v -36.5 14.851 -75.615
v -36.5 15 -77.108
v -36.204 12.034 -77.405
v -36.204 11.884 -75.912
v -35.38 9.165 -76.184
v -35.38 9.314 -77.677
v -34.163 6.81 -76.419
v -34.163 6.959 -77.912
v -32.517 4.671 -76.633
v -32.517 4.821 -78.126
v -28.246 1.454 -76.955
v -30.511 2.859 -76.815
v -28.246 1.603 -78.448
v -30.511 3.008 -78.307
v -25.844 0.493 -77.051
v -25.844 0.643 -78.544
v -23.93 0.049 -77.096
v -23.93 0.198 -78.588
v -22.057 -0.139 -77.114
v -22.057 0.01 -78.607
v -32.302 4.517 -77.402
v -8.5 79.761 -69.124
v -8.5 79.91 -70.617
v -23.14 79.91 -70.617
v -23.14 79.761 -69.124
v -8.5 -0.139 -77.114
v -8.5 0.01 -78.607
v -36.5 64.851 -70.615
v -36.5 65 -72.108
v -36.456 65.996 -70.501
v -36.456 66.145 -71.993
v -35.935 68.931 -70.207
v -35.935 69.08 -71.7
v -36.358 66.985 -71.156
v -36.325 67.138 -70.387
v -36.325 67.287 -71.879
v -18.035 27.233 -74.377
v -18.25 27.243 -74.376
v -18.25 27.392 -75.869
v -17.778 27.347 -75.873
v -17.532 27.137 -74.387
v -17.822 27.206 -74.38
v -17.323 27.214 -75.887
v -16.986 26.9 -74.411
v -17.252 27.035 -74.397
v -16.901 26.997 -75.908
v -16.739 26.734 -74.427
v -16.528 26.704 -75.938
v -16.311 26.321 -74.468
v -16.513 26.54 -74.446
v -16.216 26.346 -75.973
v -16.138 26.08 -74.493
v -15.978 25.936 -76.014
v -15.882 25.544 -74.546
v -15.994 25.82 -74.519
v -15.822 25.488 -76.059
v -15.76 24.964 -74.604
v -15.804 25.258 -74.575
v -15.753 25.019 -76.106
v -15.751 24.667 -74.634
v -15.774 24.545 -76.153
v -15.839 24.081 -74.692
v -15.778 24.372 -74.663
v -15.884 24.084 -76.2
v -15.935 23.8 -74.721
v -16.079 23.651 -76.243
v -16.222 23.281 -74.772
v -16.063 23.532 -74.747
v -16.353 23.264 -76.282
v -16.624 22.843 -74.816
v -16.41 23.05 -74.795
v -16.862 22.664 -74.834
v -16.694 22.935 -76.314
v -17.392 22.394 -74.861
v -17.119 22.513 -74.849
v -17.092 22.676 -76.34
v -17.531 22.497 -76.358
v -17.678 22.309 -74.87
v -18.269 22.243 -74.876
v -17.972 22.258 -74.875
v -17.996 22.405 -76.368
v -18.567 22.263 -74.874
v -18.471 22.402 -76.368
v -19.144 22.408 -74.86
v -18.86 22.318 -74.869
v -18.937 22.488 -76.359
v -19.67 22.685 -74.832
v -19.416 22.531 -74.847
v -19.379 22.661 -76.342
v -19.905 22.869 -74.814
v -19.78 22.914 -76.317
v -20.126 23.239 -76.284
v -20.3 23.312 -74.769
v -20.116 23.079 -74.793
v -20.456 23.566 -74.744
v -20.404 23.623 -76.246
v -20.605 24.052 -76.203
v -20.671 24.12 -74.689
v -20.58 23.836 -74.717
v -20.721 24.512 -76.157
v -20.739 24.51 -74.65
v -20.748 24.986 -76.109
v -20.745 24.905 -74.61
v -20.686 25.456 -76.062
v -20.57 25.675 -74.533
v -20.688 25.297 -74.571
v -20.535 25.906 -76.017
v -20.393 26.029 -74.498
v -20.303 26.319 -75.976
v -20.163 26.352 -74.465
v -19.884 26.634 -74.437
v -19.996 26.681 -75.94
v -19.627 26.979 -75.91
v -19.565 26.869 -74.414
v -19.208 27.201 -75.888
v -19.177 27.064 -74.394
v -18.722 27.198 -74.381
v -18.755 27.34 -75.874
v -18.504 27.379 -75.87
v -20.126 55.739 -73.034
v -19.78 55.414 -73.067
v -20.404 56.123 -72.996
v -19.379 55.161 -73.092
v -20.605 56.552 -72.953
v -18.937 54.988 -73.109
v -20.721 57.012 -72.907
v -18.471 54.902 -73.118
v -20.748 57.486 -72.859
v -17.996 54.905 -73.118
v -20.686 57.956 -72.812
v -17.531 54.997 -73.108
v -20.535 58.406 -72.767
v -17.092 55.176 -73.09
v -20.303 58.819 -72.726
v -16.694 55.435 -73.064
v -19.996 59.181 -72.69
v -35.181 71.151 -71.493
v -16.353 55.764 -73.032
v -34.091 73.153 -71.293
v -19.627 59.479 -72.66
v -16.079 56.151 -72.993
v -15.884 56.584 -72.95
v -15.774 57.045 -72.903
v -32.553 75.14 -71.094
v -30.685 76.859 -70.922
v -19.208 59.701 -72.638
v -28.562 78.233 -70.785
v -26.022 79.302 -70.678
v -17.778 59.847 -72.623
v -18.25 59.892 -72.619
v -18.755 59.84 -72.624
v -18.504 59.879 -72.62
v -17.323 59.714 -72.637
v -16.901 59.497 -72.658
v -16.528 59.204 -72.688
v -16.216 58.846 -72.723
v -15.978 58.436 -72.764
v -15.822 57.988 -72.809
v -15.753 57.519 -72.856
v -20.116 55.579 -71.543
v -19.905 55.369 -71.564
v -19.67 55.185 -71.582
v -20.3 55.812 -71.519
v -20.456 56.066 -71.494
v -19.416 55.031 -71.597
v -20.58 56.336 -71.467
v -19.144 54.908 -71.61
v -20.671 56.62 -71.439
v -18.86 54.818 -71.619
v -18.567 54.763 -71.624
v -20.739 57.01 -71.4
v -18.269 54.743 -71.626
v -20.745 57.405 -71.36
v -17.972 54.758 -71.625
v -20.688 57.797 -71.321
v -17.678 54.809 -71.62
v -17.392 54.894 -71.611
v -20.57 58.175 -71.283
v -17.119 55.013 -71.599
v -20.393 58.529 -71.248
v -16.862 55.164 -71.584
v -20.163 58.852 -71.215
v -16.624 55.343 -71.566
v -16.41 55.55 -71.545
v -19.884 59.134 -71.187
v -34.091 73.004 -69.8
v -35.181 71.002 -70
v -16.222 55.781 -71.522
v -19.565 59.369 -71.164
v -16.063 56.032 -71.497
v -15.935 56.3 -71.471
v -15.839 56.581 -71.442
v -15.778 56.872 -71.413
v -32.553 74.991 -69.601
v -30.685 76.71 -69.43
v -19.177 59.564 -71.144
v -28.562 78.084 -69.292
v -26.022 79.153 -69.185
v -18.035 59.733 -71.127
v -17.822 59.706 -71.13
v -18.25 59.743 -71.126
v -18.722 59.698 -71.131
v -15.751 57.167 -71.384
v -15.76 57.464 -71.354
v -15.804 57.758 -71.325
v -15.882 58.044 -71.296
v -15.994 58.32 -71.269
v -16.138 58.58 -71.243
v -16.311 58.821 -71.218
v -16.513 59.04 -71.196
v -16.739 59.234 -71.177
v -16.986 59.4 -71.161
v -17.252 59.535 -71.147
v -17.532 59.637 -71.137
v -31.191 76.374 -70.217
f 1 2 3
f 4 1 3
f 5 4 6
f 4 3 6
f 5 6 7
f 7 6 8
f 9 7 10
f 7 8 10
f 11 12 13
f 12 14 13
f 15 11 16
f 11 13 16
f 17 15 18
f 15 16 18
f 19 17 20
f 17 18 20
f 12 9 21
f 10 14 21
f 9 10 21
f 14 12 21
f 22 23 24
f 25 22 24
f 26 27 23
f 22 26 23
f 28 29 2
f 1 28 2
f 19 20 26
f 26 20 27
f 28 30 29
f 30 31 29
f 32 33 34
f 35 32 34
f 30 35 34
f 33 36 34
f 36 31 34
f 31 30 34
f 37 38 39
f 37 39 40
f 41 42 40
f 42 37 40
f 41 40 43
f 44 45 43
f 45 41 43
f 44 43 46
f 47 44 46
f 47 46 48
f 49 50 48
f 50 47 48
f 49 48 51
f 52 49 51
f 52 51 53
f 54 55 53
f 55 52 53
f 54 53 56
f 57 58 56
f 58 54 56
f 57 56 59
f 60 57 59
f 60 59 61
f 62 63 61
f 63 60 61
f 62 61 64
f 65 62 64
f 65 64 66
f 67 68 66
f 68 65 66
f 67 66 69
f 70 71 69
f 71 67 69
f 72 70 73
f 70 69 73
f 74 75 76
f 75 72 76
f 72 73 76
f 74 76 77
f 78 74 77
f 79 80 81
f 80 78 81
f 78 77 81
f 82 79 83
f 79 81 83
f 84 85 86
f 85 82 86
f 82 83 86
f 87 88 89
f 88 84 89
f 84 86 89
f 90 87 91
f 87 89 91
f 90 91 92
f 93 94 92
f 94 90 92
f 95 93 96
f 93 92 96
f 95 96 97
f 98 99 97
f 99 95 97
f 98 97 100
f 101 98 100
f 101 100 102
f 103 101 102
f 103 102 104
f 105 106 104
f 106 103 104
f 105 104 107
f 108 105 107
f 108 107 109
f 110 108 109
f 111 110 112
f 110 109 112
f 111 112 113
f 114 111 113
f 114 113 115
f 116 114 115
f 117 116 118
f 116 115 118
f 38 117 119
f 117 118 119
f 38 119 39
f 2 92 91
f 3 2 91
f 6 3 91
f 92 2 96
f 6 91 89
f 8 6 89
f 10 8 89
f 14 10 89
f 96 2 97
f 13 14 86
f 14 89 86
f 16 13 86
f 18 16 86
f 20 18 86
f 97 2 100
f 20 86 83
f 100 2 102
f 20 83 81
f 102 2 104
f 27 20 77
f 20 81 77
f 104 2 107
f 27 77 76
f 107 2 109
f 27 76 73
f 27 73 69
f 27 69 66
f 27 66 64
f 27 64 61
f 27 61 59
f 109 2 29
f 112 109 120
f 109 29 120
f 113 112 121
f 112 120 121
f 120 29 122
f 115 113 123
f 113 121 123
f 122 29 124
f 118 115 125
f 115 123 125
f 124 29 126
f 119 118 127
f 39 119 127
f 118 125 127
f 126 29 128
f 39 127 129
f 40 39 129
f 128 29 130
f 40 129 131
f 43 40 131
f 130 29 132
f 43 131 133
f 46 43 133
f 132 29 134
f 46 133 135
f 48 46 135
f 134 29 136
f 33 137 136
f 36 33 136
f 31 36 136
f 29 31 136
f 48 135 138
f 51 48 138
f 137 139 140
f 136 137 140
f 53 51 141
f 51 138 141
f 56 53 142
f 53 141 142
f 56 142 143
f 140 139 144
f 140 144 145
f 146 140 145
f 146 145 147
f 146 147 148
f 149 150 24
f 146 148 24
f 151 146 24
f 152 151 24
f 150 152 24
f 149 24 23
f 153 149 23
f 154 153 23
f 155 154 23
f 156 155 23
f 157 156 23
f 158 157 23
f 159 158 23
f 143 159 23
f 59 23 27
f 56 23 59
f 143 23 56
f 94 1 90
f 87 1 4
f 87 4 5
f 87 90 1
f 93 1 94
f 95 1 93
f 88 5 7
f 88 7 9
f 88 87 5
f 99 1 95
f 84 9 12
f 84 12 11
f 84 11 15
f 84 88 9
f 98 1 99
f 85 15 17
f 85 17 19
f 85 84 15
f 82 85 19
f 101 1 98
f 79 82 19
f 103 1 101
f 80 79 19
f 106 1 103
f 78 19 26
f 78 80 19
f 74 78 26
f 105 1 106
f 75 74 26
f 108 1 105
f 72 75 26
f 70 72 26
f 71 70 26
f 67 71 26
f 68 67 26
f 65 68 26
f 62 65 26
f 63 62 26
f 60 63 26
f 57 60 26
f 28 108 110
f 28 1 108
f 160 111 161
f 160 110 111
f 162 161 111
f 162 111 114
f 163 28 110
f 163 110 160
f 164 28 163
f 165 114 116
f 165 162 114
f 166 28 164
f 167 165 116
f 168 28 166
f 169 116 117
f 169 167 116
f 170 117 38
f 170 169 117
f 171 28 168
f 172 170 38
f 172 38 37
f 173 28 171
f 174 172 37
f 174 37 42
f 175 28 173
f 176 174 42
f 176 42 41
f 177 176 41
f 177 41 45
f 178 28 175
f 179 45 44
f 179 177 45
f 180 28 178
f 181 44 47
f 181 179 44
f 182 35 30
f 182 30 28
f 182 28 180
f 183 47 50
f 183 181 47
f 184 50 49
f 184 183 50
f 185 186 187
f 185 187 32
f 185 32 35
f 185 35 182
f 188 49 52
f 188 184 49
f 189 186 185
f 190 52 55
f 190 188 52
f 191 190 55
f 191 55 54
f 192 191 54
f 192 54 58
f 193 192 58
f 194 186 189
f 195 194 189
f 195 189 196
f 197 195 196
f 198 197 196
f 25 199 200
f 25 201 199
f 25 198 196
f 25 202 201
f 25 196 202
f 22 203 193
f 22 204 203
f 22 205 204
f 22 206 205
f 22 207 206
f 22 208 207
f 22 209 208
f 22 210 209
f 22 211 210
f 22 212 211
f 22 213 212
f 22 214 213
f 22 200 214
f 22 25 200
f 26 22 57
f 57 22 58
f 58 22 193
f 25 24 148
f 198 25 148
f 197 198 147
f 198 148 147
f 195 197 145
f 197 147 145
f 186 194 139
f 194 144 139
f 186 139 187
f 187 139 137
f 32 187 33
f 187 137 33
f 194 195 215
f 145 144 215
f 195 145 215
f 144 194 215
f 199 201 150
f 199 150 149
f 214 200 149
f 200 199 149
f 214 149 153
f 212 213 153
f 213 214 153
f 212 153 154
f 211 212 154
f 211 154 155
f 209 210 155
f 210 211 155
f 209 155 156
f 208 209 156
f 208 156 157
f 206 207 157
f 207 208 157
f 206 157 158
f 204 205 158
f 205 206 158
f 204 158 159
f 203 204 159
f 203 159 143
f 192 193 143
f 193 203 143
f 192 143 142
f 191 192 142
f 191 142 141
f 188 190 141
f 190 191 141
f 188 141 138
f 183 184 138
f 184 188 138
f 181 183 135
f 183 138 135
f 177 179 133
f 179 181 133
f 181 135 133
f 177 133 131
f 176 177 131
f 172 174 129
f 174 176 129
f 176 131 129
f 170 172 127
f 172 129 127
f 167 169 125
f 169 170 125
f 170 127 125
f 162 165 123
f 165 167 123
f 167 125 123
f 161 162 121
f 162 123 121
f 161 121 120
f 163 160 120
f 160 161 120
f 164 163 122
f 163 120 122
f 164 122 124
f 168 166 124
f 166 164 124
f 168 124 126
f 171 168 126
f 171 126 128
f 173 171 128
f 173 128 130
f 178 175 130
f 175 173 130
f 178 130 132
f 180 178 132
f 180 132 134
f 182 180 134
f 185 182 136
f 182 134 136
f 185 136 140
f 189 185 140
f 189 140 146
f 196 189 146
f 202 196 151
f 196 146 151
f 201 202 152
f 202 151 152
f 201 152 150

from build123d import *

# Parameters (mm, degrees)
BOSS_EXTRUDE2_DEPTH = 1.5
SKETCH2_RX          = 2.512468905
SKETCH2_RY          = 2.5
CUT_EXTRUDE1_DEPTH  = 82.304057571


with BuildPart() as part:
    # Sketch1 → Boss-Extrude2 (new body)
    with BuildSketch(Plane(origin=(0, 7.782968327, -77.829683267), x_dir=(1, 0, 0), z_dir=(0, -0.09950371902099842, 0.9950371902099893))):
        with BuildLine():
            Line((-22.056639236, -7.811403035), (-8.5, -7.811403035))
            Line((-8.5, -7.811403035), (-8.5, 72.486835274))
            Line((-8.5, 72.486835274), (-23.140108221, 72.486835274))
            add(Edge.make_bspline(
                [(-23.140108221, 72.486835274), (-33.185752444, 71.376302341), (-35.93451502, 61.602554427)],
                knots=[3.25115225, 3.25115225, 3.25115225, 4.436931985, 4.436931985, 4.436931985], degree=2, weights=[1, 0.829329402, 1]))
            add(Edge.make_bspline(
                [(-35.93451502, 61.602554427), (-36.5, 59.591865073), (-36.5, 57.502405173)],
                knots=[1.295339331, 1.295339331, 1.295339331, 1.570796327, 1.570796327, 1.570796327], degree=2, weights=[1, 0.990530414, 1]))
            Line((-36.5, 57.502405173), (-36.5, 7.253027067))
            add(Edge.make_bspline(
                [(-36.5, 7.253027067), (-36.5, -7.272375759), (-22.056639236, -7.811403035)],
                knots=[4.71238898, 4.71238898, 4.71238898, 6.246067502, 6.246067502, 6.246067502], degree=2, weights=[1, 0.720107382, 1]))
        make_face()
    extrude(amount=BOSS_EXTRUDE2_DEPTH)

    # Sketch2 → Cut-Extrude1 (cut, through all)
    with BuildSketch(Plane(origin=(0, 7.782968327, -77.829683267), x_dir=(-1, 0, 0), z_dir=(0, 0.0995037190209984, -0.9950371902099893))):
        with Locations(Location((18.25, 17.194242647), (0, 0, 90))):
            Ellipse(SKETCH2_RX, SKETCH2_RY)
        with Locations(Location((18.25, 49.856338415), (0, 0, 90))):
            Ellipse(SKETCH2_RX, SKETCH2_RY)
    extrude(amount=-CUT_EXTRUDE1_DEPTH, mode=Mode.SUBTRACT)


solid = part.part
